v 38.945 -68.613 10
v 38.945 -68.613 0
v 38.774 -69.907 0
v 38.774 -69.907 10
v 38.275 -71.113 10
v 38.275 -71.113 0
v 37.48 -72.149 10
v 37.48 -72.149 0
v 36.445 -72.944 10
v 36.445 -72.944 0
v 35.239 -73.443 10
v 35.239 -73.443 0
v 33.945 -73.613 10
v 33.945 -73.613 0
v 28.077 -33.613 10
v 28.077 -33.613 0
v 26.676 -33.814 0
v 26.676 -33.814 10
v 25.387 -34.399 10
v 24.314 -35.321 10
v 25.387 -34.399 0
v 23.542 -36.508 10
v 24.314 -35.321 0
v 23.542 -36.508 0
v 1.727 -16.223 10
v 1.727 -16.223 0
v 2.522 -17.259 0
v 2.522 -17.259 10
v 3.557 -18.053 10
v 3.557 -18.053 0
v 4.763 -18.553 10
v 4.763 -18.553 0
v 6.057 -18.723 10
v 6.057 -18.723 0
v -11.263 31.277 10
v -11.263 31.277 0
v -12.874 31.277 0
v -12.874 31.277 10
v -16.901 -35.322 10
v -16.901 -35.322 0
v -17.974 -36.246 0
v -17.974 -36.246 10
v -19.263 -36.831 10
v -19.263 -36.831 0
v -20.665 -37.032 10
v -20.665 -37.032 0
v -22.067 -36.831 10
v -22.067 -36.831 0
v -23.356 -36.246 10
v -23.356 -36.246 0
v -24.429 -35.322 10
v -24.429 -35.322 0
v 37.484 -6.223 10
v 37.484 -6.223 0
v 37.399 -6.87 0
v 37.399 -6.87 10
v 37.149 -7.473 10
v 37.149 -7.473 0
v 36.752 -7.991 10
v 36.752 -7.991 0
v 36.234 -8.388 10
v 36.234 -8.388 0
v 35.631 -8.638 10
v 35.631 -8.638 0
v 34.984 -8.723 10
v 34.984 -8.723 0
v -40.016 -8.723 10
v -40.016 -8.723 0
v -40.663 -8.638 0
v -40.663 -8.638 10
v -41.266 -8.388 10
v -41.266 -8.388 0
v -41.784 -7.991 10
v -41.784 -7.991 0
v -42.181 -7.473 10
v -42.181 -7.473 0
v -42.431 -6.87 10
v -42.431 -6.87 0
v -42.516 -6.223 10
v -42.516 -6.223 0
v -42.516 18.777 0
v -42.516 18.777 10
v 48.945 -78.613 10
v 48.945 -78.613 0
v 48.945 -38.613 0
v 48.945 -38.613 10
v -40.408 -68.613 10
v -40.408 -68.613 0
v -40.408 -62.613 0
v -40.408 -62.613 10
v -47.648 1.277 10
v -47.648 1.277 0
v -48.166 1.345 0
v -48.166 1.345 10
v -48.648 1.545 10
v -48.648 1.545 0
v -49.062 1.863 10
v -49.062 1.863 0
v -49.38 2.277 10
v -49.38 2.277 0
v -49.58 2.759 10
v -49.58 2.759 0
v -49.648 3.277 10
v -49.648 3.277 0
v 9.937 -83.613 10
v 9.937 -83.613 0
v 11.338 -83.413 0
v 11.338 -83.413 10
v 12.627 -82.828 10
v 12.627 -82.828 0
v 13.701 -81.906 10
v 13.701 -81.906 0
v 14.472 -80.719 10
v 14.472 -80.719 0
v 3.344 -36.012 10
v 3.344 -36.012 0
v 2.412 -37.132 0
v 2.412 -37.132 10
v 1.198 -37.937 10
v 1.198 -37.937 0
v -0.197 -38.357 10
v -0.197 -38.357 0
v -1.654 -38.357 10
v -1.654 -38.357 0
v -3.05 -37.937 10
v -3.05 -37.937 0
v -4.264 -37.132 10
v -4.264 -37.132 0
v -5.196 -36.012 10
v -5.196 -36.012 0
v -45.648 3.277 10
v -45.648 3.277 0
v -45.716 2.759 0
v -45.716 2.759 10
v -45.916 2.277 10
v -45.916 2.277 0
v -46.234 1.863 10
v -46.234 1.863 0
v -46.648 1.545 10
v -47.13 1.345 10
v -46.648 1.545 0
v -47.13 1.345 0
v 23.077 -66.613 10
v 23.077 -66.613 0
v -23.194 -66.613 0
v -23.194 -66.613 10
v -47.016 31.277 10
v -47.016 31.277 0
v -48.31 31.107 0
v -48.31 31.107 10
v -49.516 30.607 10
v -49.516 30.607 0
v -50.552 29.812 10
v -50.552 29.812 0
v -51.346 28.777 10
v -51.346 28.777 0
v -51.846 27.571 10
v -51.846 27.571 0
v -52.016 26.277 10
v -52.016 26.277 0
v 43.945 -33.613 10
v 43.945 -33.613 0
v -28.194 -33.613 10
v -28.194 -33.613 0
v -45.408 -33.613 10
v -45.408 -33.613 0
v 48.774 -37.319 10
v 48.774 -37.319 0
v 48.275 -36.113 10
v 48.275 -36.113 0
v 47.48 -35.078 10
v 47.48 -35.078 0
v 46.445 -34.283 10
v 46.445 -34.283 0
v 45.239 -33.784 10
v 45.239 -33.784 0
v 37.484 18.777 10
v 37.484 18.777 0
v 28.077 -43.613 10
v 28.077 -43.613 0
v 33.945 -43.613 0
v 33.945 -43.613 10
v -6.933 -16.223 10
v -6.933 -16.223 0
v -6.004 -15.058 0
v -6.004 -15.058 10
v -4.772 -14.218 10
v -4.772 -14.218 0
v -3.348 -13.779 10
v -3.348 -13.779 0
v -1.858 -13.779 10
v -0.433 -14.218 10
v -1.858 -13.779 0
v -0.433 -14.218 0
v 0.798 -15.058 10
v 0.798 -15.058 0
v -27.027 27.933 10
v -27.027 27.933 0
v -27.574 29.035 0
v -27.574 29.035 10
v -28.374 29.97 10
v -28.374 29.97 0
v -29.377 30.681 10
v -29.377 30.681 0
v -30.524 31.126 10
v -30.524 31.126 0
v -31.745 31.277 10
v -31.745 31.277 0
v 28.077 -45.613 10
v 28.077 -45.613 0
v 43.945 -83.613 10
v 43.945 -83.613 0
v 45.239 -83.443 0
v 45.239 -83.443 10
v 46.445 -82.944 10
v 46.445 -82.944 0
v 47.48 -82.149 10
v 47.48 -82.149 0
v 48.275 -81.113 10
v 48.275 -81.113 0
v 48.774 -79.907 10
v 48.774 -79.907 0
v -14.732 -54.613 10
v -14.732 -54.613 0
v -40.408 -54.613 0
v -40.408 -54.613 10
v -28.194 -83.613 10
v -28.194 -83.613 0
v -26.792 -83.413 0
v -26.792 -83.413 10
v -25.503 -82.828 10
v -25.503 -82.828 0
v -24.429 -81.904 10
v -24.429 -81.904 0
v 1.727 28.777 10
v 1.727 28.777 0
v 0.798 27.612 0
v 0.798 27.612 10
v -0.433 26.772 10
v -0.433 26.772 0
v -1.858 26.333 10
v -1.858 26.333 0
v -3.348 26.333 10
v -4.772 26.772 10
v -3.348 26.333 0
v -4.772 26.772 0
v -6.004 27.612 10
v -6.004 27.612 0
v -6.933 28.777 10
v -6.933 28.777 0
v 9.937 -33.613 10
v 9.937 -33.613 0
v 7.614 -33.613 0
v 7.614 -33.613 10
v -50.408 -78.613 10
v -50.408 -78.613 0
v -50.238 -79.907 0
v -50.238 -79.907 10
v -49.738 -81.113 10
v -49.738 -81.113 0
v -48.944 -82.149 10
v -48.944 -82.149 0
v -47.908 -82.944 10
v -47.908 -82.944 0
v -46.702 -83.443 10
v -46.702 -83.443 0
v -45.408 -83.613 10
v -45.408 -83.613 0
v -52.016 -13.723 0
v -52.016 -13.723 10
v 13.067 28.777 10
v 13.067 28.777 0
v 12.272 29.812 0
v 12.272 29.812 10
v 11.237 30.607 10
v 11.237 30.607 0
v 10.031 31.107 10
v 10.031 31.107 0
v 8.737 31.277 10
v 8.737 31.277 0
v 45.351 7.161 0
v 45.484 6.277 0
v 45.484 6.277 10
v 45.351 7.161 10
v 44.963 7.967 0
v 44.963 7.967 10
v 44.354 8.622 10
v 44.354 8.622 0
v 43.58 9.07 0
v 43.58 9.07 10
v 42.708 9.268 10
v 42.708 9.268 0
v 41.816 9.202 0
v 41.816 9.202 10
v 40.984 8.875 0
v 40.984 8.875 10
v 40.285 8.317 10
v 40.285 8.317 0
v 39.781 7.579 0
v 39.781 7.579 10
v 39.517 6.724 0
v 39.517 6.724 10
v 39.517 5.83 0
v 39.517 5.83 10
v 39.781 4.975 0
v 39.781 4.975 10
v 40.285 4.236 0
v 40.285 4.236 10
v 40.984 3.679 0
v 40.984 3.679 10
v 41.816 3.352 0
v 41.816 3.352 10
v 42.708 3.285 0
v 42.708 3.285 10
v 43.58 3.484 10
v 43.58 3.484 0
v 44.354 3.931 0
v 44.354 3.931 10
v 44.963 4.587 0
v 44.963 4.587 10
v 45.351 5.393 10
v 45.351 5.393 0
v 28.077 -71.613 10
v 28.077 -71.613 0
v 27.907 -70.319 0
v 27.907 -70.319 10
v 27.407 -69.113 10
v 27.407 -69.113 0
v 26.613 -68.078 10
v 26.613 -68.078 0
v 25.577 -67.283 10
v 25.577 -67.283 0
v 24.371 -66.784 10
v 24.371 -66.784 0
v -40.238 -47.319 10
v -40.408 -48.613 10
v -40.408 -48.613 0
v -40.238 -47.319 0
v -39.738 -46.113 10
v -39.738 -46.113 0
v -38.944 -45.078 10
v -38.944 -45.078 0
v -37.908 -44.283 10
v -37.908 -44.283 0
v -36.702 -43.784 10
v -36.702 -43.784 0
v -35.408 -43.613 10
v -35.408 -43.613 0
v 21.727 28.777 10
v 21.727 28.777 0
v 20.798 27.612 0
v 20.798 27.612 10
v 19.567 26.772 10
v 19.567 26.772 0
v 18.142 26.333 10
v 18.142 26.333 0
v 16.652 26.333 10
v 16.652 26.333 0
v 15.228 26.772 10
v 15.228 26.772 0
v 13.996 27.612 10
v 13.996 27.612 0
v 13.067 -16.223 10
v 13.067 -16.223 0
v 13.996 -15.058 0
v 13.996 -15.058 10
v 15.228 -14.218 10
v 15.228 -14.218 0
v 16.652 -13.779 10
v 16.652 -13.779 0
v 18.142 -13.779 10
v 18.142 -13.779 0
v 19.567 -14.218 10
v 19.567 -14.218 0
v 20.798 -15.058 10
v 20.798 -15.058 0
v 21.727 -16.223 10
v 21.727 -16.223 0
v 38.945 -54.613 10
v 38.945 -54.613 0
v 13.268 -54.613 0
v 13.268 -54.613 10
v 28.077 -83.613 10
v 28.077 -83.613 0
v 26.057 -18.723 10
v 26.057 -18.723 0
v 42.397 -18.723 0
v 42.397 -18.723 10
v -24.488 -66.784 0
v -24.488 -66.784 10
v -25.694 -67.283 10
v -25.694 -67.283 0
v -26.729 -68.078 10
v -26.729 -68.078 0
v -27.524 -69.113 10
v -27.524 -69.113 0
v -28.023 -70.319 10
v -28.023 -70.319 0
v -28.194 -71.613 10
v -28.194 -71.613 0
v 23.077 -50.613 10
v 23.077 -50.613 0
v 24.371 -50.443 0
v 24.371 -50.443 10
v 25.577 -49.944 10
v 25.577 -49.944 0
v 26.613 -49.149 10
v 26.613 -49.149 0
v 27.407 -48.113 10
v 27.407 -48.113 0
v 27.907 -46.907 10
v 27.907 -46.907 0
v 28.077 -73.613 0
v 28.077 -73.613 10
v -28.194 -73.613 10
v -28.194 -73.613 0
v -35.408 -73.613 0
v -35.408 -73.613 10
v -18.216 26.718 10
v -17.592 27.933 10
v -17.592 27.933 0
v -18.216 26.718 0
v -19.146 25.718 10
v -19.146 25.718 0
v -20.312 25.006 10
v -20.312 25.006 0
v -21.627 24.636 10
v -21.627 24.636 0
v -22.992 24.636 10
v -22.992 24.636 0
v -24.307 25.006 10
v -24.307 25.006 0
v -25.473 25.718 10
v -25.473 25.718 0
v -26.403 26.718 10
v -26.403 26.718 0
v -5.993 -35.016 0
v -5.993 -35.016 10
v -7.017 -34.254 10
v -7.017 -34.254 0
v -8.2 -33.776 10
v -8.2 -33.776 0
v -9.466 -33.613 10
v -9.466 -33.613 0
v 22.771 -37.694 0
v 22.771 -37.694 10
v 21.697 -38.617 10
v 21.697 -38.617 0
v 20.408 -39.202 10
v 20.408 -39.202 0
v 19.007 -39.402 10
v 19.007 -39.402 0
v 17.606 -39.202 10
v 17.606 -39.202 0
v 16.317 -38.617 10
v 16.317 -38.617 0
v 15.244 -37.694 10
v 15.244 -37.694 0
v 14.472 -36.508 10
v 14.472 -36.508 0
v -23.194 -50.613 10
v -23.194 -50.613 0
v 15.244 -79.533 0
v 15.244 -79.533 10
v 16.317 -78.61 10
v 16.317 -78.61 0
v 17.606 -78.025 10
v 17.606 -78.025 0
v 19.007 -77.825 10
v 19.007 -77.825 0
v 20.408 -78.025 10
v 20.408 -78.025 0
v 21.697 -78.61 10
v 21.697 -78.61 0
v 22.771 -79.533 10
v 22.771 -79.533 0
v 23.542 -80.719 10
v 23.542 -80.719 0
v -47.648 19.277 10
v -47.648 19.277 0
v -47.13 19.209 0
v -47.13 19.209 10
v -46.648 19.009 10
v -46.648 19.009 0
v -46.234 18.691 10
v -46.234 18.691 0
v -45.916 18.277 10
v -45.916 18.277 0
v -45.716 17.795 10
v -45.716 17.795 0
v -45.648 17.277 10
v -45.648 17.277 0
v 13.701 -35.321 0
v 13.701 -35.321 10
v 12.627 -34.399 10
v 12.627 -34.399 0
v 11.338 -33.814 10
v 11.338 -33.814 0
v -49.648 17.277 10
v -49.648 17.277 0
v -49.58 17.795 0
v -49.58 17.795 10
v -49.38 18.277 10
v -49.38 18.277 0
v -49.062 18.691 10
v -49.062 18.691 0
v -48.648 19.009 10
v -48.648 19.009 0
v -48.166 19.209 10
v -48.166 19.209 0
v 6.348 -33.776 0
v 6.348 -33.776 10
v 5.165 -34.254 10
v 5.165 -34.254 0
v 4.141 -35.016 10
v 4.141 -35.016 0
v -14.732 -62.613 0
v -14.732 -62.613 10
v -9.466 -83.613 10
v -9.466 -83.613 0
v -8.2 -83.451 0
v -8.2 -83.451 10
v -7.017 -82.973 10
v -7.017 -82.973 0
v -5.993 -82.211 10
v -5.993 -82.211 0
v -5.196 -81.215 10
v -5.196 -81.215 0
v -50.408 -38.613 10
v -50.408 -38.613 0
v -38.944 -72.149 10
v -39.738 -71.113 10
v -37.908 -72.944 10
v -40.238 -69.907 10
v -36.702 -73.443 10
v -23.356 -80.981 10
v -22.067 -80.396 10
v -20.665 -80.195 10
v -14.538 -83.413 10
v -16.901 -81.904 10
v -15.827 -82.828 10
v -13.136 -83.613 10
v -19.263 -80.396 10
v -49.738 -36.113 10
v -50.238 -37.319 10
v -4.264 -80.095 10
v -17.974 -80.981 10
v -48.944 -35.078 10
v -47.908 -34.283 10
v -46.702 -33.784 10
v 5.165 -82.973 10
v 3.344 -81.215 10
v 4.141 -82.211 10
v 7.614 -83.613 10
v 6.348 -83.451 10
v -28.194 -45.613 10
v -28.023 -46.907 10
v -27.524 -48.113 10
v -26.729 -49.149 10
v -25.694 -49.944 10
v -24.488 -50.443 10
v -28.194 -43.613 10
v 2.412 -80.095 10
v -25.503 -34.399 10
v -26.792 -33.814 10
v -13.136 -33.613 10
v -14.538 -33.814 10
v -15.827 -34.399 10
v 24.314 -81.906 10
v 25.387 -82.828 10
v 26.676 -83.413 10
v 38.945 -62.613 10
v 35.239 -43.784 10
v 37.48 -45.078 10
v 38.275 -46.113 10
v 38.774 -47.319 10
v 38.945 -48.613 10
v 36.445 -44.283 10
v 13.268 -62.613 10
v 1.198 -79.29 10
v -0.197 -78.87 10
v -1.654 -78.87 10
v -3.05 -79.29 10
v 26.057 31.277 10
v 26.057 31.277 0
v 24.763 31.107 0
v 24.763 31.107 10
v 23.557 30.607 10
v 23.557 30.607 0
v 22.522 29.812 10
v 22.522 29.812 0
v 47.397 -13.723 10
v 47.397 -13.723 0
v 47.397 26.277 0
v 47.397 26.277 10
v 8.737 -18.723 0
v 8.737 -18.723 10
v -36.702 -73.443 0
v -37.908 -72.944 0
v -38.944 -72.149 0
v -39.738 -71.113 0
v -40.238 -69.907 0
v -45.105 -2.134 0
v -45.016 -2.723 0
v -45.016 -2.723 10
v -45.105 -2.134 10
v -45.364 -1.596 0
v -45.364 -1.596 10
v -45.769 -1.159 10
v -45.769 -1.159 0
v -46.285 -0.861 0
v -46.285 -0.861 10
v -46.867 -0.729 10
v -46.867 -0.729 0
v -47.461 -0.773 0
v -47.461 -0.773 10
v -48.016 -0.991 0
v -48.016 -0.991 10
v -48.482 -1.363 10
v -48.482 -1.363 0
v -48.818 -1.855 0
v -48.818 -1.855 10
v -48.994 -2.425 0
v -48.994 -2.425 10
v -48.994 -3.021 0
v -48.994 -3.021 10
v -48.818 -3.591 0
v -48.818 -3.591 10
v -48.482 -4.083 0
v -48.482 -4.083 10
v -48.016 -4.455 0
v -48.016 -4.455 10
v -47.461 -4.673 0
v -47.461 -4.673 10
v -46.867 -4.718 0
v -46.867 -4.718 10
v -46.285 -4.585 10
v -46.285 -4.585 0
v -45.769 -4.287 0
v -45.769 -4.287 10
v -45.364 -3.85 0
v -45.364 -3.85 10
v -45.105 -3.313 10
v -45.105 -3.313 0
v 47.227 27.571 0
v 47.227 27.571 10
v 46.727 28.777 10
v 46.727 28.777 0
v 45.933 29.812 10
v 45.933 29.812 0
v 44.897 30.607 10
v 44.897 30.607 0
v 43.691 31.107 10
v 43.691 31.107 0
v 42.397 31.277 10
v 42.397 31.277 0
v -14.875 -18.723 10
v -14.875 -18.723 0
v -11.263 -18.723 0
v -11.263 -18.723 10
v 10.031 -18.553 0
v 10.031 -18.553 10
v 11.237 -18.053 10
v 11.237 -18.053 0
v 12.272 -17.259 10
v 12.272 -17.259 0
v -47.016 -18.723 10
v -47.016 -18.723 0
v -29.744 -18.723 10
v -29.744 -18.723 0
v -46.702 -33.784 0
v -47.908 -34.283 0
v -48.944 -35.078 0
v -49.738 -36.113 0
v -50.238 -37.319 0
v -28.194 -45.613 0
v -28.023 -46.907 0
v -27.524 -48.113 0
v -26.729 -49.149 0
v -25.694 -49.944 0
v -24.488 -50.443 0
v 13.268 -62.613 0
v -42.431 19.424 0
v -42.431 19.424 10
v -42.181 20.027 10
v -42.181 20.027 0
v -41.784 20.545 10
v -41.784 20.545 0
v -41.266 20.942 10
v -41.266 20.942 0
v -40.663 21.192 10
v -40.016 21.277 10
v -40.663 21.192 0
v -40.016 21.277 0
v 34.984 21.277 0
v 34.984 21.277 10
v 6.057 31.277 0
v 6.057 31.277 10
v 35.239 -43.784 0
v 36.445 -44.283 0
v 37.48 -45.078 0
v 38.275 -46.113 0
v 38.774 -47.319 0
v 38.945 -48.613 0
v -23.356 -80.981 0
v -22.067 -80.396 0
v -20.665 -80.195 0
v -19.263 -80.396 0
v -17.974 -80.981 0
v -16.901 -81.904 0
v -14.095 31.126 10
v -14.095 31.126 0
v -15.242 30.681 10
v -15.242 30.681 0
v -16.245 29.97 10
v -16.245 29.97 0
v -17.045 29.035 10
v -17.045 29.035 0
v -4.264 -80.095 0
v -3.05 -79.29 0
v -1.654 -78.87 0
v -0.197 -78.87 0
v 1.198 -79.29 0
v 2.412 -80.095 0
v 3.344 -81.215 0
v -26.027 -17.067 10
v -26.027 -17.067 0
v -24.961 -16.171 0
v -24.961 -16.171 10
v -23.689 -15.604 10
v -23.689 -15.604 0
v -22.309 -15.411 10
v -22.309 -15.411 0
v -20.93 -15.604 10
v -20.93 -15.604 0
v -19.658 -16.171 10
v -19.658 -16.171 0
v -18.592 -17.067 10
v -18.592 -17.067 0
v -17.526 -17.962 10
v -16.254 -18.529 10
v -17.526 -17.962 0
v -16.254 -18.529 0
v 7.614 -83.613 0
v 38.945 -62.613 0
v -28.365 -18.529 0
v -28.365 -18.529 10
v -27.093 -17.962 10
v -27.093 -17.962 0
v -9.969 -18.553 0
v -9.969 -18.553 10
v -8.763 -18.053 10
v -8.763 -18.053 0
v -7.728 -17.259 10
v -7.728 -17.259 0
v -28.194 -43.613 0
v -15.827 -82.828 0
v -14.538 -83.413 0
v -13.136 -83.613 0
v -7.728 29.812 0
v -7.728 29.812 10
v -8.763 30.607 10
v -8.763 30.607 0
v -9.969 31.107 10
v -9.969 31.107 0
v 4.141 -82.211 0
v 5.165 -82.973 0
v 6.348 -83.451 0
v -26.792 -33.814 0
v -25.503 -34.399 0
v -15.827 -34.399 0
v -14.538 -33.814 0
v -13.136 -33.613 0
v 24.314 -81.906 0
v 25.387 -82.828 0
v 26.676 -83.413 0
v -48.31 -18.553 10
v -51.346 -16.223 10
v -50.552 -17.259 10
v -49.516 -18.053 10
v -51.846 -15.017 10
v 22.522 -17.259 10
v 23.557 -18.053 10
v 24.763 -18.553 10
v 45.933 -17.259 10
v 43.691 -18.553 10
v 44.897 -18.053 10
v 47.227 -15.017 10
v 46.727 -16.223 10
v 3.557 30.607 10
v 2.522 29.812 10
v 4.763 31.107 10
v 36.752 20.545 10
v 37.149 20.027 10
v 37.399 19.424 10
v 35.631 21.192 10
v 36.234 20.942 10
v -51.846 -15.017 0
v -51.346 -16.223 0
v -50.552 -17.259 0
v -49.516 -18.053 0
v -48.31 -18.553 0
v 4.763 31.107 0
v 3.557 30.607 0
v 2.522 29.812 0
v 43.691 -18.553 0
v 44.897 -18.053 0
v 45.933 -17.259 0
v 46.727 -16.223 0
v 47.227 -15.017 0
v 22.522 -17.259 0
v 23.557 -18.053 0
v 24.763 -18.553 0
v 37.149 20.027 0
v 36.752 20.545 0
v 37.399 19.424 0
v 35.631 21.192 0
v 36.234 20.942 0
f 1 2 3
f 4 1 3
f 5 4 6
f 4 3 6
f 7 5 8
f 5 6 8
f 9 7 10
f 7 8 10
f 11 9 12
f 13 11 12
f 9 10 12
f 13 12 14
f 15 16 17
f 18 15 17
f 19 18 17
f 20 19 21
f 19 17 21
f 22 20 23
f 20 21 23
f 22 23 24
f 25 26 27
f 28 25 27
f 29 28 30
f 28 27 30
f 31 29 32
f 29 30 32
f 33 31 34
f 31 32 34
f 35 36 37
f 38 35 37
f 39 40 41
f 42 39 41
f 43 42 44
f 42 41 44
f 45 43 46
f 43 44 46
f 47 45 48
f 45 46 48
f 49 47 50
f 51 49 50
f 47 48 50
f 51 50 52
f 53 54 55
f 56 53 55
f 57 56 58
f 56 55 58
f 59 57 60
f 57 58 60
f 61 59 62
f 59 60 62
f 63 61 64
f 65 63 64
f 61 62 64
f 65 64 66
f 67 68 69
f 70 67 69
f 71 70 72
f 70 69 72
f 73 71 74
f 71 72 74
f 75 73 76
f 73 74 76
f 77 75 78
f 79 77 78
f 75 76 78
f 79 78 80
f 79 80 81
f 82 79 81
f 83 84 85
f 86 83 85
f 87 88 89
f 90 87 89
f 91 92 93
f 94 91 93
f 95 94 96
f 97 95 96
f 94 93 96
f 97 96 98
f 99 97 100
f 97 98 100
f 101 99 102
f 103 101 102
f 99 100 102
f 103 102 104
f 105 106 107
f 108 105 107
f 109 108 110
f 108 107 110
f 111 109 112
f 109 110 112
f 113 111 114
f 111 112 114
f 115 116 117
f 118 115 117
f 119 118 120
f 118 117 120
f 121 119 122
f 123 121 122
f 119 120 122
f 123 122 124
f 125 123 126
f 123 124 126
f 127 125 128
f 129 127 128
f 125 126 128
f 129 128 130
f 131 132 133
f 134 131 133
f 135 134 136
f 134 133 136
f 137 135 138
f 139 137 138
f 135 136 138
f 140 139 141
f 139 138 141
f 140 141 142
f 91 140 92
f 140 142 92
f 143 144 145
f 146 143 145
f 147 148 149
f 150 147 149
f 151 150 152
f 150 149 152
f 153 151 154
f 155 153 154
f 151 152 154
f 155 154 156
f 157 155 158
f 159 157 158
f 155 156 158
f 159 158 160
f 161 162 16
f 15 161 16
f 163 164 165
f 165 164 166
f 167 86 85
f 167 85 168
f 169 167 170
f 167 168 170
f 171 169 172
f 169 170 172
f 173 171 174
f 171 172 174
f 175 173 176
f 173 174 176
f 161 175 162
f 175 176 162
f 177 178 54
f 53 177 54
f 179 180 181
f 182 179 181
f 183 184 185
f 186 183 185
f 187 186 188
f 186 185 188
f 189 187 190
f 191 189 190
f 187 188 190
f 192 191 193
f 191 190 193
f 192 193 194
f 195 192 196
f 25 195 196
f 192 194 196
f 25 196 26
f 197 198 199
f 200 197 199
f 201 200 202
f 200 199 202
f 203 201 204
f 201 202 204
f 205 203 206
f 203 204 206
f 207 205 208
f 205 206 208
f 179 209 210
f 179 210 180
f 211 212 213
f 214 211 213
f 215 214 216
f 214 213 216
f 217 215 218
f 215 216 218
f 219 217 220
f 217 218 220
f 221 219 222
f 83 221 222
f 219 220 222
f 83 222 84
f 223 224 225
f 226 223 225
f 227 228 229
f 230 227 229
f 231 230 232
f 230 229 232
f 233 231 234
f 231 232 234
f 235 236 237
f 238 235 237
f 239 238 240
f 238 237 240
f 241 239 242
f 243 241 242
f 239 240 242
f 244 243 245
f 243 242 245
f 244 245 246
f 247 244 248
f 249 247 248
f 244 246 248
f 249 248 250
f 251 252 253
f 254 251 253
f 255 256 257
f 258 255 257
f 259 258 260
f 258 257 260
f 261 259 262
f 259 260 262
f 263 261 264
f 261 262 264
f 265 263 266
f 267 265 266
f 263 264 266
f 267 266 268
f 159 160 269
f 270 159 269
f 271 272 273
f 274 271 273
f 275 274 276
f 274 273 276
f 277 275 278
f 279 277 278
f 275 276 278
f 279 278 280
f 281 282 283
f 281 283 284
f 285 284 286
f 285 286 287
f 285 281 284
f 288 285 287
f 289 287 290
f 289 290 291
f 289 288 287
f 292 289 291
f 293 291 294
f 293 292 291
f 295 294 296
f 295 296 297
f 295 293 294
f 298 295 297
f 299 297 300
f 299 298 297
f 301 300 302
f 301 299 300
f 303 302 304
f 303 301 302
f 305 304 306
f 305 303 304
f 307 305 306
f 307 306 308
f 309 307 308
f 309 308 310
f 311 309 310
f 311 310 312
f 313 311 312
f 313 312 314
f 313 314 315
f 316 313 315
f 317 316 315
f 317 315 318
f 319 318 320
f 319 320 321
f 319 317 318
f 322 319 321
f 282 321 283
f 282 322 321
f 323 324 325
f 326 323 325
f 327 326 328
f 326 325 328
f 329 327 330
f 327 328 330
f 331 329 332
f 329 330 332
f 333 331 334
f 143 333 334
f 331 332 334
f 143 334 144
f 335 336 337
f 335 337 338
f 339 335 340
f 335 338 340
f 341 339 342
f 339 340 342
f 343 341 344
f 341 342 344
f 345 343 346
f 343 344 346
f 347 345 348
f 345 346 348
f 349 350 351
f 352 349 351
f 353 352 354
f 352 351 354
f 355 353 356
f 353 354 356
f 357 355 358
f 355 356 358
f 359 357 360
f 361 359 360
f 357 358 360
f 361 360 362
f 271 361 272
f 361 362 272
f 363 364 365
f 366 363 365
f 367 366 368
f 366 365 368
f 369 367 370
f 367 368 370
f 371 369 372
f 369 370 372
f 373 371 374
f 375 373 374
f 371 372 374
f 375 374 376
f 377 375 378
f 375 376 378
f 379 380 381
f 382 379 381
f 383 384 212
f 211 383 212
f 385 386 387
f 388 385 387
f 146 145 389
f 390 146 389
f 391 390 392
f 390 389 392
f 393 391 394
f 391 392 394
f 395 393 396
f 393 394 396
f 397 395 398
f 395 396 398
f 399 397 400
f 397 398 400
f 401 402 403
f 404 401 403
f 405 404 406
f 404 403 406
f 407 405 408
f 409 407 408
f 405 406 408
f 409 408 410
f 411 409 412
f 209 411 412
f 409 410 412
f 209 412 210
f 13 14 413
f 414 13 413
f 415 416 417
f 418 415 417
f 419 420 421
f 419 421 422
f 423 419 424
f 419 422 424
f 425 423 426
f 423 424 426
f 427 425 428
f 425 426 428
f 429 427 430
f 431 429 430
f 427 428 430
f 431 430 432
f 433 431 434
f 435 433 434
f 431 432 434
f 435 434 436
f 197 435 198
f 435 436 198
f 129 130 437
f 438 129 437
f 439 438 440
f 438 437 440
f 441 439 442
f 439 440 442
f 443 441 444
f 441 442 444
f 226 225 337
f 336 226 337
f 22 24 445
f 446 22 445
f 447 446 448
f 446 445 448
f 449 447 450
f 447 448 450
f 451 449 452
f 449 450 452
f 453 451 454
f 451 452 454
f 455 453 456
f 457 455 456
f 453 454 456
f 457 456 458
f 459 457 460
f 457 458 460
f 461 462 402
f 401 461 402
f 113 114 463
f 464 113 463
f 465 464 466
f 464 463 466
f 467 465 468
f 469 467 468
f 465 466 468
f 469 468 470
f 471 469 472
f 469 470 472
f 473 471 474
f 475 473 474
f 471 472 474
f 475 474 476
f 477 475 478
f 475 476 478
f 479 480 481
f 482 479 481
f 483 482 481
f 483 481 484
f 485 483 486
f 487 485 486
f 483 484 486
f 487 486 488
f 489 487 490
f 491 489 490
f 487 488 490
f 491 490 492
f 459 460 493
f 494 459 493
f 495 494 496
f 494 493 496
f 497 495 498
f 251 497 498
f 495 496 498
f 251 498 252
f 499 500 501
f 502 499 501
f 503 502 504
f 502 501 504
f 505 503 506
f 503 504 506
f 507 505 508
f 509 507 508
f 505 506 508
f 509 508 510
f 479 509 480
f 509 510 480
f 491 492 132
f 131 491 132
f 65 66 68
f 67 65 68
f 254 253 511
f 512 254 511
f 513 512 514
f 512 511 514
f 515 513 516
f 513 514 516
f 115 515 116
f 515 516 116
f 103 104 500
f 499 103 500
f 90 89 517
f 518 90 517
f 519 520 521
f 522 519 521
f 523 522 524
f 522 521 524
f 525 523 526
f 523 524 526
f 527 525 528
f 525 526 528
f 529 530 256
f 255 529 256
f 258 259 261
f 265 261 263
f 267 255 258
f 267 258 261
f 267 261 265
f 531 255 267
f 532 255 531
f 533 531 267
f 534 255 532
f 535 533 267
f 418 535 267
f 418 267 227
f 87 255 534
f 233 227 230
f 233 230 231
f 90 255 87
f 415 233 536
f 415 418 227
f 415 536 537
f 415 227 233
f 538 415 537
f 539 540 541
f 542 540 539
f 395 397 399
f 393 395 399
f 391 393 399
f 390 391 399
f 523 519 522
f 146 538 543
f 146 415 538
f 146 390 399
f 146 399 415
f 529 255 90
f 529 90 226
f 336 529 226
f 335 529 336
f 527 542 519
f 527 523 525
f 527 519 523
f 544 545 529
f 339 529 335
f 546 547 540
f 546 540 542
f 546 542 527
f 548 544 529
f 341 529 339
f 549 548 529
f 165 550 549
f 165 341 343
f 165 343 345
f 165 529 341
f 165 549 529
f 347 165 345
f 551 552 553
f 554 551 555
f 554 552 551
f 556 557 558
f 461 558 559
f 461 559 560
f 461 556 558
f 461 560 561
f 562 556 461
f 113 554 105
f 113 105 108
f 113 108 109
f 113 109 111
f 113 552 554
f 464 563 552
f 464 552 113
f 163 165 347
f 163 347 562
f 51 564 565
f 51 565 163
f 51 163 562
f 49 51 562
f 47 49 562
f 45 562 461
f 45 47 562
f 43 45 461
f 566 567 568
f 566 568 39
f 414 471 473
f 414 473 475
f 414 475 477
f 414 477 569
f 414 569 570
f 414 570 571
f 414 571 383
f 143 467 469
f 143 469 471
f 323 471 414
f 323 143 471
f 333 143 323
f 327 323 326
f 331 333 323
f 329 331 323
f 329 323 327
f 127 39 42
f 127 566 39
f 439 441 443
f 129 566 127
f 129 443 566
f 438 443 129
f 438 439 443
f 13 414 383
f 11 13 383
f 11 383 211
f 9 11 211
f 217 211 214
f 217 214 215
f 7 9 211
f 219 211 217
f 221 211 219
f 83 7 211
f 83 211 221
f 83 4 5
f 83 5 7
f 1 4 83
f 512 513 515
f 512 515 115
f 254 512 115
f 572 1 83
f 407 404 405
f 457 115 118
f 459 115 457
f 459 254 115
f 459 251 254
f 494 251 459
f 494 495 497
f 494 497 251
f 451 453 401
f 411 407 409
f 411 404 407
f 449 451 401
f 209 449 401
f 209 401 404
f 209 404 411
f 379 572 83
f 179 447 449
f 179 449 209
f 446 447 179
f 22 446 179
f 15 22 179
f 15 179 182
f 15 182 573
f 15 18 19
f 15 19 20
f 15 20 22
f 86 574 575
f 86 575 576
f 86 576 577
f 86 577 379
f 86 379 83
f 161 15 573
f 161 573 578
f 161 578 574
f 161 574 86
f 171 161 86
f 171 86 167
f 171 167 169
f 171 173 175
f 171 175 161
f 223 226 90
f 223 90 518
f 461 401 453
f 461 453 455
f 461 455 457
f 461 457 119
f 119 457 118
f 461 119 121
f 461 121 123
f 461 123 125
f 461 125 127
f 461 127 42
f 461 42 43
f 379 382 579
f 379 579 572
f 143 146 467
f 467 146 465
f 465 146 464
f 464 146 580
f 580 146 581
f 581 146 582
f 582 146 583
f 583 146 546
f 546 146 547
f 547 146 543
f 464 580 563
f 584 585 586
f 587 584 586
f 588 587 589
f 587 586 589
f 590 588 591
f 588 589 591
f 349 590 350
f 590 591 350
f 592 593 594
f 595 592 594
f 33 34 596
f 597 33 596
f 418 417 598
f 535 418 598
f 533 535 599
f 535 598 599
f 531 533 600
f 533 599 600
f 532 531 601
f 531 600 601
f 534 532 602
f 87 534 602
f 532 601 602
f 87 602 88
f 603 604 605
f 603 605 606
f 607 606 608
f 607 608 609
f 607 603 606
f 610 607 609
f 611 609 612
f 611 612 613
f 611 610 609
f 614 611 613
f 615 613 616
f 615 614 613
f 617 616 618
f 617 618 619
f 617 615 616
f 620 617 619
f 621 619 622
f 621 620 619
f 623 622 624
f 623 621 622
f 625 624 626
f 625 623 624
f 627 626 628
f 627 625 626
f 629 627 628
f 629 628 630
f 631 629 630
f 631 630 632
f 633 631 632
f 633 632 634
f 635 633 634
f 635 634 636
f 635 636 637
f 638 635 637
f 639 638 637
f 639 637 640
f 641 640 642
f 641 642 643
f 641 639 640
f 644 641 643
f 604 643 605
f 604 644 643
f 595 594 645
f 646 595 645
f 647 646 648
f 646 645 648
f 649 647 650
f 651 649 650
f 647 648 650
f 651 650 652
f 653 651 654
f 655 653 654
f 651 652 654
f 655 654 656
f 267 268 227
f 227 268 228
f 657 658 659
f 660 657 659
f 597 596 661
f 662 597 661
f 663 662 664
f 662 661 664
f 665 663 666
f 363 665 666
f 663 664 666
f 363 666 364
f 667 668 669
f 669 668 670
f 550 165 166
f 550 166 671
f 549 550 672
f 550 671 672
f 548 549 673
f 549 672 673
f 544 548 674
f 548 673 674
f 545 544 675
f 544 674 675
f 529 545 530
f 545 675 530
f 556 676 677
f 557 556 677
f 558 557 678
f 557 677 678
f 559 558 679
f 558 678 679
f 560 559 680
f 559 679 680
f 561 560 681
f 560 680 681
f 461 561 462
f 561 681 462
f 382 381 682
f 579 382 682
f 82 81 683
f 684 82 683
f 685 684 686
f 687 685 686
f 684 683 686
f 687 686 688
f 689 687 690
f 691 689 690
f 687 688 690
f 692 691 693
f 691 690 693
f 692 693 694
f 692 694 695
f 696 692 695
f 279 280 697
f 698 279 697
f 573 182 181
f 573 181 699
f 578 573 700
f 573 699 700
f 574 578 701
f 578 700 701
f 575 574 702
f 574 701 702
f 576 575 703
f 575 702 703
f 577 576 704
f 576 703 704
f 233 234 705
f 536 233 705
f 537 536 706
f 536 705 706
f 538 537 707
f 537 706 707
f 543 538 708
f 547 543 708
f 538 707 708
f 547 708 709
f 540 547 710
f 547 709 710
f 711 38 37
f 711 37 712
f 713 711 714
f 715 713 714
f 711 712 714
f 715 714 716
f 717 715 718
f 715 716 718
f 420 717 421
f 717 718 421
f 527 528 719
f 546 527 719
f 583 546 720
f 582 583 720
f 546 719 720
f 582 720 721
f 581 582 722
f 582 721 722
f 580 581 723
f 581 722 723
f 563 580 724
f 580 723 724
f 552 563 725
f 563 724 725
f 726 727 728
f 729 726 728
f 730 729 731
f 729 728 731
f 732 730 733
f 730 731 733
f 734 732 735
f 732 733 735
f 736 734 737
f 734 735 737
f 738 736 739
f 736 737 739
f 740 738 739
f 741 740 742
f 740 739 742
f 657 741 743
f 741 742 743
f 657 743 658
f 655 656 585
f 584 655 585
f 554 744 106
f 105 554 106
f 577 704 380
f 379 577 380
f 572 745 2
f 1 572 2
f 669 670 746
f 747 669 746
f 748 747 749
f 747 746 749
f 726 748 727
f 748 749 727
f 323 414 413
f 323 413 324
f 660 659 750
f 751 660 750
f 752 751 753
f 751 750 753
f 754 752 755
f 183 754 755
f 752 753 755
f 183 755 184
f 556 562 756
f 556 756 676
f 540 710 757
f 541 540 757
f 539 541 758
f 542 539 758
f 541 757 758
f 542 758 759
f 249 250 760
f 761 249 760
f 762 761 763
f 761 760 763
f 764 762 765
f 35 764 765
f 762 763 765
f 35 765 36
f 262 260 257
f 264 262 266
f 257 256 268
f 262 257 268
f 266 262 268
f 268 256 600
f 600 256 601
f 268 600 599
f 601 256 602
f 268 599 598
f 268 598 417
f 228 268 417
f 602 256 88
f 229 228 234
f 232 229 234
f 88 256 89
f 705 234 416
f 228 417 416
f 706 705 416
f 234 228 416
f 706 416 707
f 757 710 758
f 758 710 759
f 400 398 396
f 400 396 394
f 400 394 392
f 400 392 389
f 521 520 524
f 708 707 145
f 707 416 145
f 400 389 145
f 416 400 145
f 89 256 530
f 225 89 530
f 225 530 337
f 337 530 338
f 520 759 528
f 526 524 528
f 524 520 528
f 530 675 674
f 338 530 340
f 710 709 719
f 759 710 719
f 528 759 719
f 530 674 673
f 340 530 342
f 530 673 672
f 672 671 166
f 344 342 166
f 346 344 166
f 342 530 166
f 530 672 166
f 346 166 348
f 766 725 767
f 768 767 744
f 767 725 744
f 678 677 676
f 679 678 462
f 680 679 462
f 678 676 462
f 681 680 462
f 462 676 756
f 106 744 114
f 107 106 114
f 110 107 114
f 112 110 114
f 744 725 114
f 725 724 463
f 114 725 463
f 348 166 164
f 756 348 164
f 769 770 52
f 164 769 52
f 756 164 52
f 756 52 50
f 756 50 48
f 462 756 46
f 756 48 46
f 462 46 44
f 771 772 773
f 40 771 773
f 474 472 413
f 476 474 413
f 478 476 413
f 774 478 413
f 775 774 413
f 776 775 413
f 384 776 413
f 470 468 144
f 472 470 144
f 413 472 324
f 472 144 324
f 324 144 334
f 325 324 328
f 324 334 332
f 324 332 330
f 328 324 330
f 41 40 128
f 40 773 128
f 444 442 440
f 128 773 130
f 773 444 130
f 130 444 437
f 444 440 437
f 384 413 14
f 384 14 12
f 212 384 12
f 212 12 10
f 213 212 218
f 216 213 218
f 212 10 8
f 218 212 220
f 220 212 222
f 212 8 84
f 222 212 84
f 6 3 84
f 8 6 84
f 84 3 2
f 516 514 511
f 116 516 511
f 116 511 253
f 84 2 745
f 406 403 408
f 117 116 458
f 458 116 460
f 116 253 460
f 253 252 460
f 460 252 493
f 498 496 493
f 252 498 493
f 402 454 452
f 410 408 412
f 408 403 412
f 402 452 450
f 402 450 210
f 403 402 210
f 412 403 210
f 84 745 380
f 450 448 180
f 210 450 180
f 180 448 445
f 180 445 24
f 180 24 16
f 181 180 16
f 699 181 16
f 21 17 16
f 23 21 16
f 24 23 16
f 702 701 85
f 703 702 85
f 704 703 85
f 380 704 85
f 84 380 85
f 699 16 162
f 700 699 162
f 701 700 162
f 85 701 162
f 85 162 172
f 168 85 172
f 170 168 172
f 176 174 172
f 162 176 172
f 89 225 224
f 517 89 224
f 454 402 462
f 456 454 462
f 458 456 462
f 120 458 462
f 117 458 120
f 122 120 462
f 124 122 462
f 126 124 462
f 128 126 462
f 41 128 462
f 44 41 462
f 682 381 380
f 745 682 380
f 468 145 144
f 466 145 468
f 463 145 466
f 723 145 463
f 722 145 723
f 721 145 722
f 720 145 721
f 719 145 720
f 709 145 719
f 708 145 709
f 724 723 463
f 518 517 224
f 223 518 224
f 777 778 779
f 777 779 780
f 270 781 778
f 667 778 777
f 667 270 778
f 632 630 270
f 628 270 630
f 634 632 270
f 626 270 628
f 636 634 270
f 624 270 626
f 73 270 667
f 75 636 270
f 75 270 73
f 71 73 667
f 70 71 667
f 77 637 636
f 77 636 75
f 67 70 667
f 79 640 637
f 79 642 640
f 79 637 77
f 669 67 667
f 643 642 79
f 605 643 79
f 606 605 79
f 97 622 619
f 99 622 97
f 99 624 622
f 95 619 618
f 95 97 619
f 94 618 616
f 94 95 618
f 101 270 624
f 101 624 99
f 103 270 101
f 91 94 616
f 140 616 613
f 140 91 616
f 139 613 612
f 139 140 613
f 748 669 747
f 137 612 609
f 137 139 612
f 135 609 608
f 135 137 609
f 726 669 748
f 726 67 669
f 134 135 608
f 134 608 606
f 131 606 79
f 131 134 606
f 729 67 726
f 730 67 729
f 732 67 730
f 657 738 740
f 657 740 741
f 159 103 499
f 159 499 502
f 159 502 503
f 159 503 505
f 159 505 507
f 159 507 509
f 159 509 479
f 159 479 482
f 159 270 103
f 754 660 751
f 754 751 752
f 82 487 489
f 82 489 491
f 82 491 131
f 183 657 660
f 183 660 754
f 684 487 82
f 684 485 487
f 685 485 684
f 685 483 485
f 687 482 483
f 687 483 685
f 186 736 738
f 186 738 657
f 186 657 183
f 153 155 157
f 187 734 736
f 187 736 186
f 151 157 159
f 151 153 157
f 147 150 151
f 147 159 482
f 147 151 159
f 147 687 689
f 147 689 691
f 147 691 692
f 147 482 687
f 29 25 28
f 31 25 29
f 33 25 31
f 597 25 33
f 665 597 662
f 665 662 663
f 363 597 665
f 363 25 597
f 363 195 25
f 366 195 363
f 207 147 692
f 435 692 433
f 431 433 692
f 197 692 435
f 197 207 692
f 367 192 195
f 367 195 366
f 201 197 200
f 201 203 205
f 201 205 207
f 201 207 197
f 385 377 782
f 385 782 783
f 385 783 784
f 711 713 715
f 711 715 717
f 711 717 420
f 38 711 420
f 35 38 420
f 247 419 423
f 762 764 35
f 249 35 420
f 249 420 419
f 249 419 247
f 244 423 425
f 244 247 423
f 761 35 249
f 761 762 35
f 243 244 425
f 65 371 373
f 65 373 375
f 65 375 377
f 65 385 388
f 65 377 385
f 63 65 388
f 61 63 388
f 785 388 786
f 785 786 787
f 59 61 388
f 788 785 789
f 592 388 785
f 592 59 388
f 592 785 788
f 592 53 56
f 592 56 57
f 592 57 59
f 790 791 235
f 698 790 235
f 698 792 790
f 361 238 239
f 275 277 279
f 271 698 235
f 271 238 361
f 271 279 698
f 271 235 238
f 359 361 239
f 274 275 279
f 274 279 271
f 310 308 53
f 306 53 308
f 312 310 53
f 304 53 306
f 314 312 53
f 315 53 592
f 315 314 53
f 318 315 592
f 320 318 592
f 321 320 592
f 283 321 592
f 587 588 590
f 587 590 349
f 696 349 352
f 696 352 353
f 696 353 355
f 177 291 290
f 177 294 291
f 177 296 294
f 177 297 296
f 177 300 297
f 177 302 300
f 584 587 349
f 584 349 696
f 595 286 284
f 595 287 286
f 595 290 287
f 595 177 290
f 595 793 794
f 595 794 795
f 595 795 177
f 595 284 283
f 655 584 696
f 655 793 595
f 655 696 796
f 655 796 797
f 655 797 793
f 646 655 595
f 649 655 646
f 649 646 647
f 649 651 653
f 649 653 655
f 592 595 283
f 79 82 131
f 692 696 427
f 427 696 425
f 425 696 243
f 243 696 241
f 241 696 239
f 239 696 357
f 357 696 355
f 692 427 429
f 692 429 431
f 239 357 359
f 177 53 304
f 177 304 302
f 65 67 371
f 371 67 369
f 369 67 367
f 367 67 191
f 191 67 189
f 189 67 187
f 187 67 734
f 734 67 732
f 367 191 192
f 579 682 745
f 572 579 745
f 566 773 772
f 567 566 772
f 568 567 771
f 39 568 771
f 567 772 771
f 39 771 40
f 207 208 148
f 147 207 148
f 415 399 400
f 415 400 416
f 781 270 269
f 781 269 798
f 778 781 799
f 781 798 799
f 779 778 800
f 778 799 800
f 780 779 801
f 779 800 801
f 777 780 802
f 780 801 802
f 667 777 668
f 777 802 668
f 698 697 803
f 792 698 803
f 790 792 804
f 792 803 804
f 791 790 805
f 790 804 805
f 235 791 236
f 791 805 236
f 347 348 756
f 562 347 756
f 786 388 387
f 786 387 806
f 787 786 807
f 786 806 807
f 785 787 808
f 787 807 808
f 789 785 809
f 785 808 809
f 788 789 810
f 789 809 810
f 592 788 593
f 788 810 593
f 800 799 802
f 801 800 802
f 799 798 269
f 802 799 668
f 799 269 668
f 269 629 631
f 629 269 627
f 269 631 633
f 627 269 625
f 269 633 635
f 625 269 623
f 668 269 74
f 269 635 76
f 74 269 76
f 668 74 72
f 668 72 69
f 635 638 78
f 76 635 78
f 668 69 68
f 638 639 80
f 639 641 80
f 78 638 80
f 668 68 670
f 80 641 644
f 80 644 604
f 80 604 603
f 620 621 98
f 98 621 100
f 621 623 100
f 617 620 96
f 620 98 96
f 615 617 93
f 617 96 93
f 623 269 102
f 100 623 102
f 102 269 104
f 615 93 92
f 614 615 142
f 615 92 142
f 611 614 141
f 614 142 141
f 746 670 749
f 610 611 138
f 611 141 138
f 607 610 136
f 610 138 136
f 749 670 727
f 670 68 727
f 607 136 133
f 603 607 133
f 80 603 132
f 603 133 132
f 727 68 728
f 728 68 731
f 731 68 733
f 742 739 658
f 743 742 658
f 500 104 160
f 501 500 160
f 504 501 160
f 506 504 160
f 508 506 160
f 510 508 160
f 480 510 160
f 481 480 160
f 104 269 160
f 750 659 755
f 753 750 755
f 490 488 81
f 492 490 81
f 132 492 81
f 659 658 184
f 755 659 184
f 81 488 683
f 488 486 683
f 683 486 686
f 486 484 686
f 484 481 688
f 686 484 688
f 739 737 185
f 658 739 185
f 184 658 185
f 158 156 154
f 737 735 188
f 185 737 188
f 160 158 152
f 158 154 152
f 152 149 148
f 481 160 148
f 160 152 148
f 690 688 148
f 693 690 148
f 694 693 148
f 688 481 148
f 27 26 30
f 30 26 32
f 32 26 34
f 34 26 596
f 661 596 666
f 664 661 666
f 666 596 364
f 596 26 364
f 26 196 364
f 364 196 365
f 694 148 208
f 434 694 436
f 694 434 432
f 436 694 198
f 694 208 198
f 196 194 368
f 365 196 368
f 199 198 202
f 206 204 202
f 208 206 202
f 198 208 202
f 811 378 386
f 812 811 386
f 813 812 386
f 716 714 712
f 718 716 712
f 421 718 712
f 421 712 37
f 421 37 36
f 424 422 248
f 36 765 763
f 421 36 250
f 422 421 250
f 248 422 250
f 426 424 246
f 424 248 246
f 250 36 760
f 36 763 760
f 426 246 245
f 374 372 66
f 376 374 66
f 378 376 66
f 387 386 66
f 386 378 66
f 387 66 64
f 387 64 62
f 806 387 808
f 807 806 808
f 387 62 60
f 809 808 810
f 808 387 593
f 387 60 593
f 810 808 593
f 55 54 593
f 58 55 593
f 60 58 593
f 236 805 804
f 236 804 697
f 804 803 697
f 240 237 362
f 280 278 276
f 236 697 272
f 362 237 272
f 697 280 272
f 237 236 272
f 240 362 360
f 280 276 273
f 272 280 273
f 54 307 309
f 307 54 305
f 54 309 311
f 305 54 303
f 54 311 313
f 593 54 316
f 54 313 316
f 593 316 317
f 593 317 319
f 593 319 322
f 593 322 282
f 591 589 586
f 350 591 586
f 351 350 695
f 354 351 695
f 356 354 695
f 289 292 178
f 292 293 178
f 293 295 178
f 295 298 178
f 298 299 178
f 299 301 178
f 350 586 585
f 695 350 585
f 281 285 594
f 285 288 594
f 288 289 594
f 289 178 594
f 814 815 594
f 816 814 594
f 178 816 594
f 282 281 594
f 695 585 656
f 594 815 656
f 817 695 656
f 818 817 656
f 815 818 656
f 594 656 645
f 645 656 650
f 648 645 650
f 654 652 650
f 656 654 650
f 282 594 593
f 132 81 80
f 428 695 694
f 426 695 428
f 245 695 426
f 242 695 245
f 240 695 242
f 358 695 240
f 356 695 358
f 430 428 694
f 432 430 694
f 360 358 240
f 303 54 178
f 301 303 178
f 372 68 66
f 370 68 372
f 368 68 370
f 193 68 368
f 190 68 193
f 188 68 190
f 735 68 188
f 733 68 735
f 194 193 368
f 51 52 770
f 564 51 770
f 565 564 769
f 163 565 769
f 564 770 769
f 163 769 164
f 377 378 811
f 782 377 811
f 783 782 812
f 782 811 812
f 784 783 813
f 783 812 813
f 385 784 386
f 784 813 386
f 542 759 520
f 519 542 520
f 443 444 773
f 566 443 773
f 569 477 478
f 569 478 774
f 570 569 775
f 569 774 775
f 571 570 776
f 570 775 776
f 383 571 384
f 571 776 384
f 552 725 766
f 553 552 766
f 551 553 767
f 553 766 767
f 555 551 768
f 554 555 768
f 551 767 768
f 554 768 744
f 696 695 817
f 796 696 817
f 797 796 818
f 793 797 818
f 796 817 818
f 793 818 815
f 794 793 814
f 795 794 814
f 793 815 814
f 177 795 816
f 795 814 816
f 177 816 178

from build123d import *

# Parameters (mm, degrees)
F0_R     = 2
F0_R_2   = 3
F1_DEPTH = 10


with BuildPart() as f1:
    # F0 (on Top) → F1 (new body)
    with BuildSketch(Plane.XY):
        with BuildLine():
            Line((-31.744891, 31.276881), (-47.016129, 31.276881))
            ThreePointArc((-47.016129, 31.276881), (-50.551663, 29.812415), (-52.016129, 26.276881))
            Line((-52.016129, 26.276881), (-52.016129, -13.723119))
            ThreePointArc((-52.016129, -13.723119), (-50.551663, -17.258653), (-47.016129, -18.723119))
            Line((-47.016129, -18.723119), (-29.744406, -18.723119))
            ThreePointArc((-29.744406, -18.723119), (-27.709536, -18.290318), (-26.026944, -17.06684))
            ThreePointArc((-26.026944, -17.06684), (-22.309481, -15.410562), (-18.592019, -17.06684))
            ThreePointArc((-18.592019, -17.06684), (-16.909426, -18.290318), (-14.874556, -18.723119))
            Line((-14.874556, -18.723119), (-11.263087, -18.723119))
            ThreePointArc((-11.263087, -18.723119), (-8.763087, -18.053246), (-6.93296, -16.223119))
            ThreePointArc((-6.93296, -16.223119), (-2.602833, -13.723119), (1.727294, -16.223119))
            ThreePointArc((1.727294, -16.223119), (3.557421, -18.053246), (6.057421, -18.723119))
            Line((6.057421, -18.723119), (8.736913, -18.723119))
            ThreePointArc((8.736913, -18.723119), (11.236913, -18.053246), (13.06704, -16.223119))
            ThreePointArc((13.06704, -16.223119), (17.397167, -13.723119), (21.727294, -16.223119))
            ThreePointArc((21.727294, -16.223119), (23.557421, -18.053246), (26.057421, -18.723119))
            Line((26.057421, -18.723119), (42.397167, -18.723119))
            ThreePointArc((42.397167, -18.723119), (45.932701, -17.258653), (47.397167, -13.723119))
            Line((47.397167, -13.723119), (47.397167, 26.276881))
            ThreePointArc((47.397167, 26.276881), (45.932701, 29.812415), (42.397167, 31.276881))
            Line((42.397167, 31.276881), (26.057421, 31.276881))
            ThreePointArc((26.057421, 31.276881), (23.557421, 30.607008), (21.727294, 28.776881))
            ThreePointArc((21.727294, 28.776881), (17.397167, 26.276881), (13.06704, 28.776881))
            ThreePointArc((13.06704, 28.776881), (11.236913, 30.607008), (8.736913, 31.276881))
            Line((8.736913, 31.276881), (6.057421, 31.276881))
            ThreePointArc((6.057421, 31.276881), (3.557421, 30.607008), (1.727294, 28.776881))
            ThreePointArc((1.727294, 28.776881), (-2.602833, 26.276881), (-6.93296, 28.776881))
            ThreePointArc((-6.93296, 28.776881), (-8.763087, 30.607008), (-11.263087, 31.276881))
            Line((-11.263087, 31.276881), (-12.874071, 31.276881))
            ThreePointArc((-12.874071, 31.276881), (-15.765317, 30.356182), (-17.591776, 27.93316))
            ThreePointArc((-17.591776, 27.93316), (-22.309481, 24.589438), (-27.027186, 27.93316))
            ThreePointArc((-27.027186, 27.93316), (-28.853645, 30.356182), (-31.744891, 31.276881))
        make_face()
        with Locations((-47.016129, -2.723119)):
            Circle(F0_R, mode=Mode.SUBTRACT)
        with BuildLine():
            ThreePointArc((-47.648095, 1.276881), (-49.062308, 1.862667), (-49.648095, 3.276881))
            Line((-49.648095, 3.276881), (-49.648095, 17.276881))
            ThreePointArc((-49.648095, 17.276881), (-49.062308, 18.691095), (-47.648095, 19.276881))
            ThreePointArc((-47.648095, 19.276881), (-46.233881, 18.691095), (-45.648095, 17.276881))
            Line((-45.648095, 17.276881), (-45.648095, 3.276881))
            ThreePointArc((-45.648095, 3.276881), (-46.233881, 1.862667), (-47.648095, 1.276881))
        make_face(mode=Mode.SUBTRACT)
        with BuildLine():
            Line((-42.516129, -6.223119), (-42.516129, 18.776881))
            ThreePointArc((-42.516129, 18.776881), (-41.783896, 20.544648), (-40.016129, 21.276881))
            Line((-40.016129, 21.276881), (34.983871, 21.276881))
            ThreePointArc((34.983871, 21.276881), (36.751638, 20.544648), (37.483871, 18.776881))
            Line((37.483871, 18.776881), (37.483871, -6.223119))
            ThreePointArc((37.483871, -6.223119), (36.751638, -7.990886), (34.983871, -8.723119))
            Line((34.983871, -8.723119), (-40.016129, -8.723119))
            ThreePointArc((-40.016129, -8.723119), (-41.783896, -7.990886), (-42.516129, -6.223119))
        make_face(mode=Mode.SUBTRACT)
        with Locations((42.483871, 6.276881)):
            Circle(F0_R_2, mode=Mode.SUBTRACT)
        with BuildLine():
            Line((-28.193538, -33.613396), (-45.408177, -33.613396))
            ThreePointArc((-45.408177, -33.613396), (-48.943711, -35.077862), (-50.408177, -38.613396))
            Line((-50.408177, -38.613396), (-50.408177, -43.613396))
            Line((-50.408177, -43.613396), (-50.408177, -73.613396))
            Line((-50.408177, -73.613396), (-50.408177, -78.613396))
            ThreePointArc((-50.408177, -78.613396), (-48.943711, -82.14893), (-45.408177, -83.613396))
            Line((-45.408177, -83.613396), (-28.193538, -83.613396))
            ThreePointArc((-28.193538, -83.613396), (-26.126502, -83.166127), (-24.429275, -81.904341))
            ThreePointArc((-24.429275, -81.904341), (-20.665012, -80.195287), (-16.900749, -81.904341))
            ThreePointArc((-16.900749, -81.904341), (-15.203521, -83.166127), (-13.136486, -83.613396))
            Line((-13.136486, -83.613396), (-9.465551, -83.613396))
            ThreePointArc((-9.465551, -83.613396), (-7.01694, -82.972789), (-5.195769, -81.215119))
            ThreePointArc((-5.195769, -81.215119), (-0.925987, -78.816841), (3.343795, -81.215119))
            ThreePointArc((3.343795, -81.215119), (5.164967, -82.972789), (7.613577, -83.613396))
            Line((7.613577, -83.613396), (9.937365, -83.613396))
            ThreePointArc((9.937365, -83.613396), (12.627289, -82.828168), (14.472332, -80.719119))
            ThreePointArc((14.472332, -80.719119), (19.007299, -77.824843), (23.542267, -80.719119))
            ThreePointArc((23.542267, -80.719119), (25.38731, -82.828168), (28.077234, -83.613396))
            Line((28.077234, -83.613396), (43.944726, -83.613396))
            ThreePointArc((43.944726, -83.613396), (47.48026, -82.14893), (48.944726, -78.613396))
            Line((48.944726, -78.613396), (48.944726, -38.613396))
            ThreePointArc((48.944726, -38.613396), (47.48026, -35.077862), (43.944726, -33.613396))
            Line((43.944726, -33.613396), (28.077234, -33.613396))
            ThreePointArc((28.077234, -33.613396), (25.38731, -34.398623), (23.542267, -36.507672))
            ThreePointArc((23.542267, -36.507672), (19.007299, -39.401949), (14.472332, -36.507672))
            ThreePointArc((14.472332, -36.507672), (12.627289, -34.398623), (9.937365, -33.613396))
            Line((9.937365, -33.613396), (7.613577, -33.613396))
            ThreePointArc((7.613577, -33.613396), (5.164967, -34.254003), (3.343795, -36.011673))
            ThreePointArc((3.343795, -36.011673), (-0.925987, -38.40995), (-5.195769, -36.011673))
            ThreePointArc((-5.195769, -36.011673), (-7.01694, -34.254003), (-9.465551, -33.613396))
            Line((-9.465551, -33.613396), (-13.136486, -33.613396))
            ThreePointArc((-13.136486, -33.613396), (-15.203521, -34.060664), (-16.900749, -35.32245))
            ThreePointArc((-16.900749, -35.32245), (-20.665012, -37.031504), (-24.429275, -35.32245))
            ThreePointArc((-24.429275, -35.32245), (-26.126502, -34.060664), (-28.193538, -33.613396))
        make_face()
        with BuildLine():
            Line((-40.408177, -54.613396), (-40.408177, -48.613396))
            ThreePointArc((-40.408177, -48.613396), (-38.943711, -45.077862), (-35.408177, -43.613396))
            Line((-35.408177, -43.613396), (-28.193538, -43.613396))
            Line((-28.193538, -43.613396), (-28.193538, -45.613396))
            ThreePointArc((-28.193538, -45.613396), (-26.729071, -49.14893), (-23.193538, -50.613396))
            Line((-23.193538, -50.613396), (0, -50.613396))
            Line((0, -50.613396), (23.077234, -50.613396))
            ThreePointArc((23.077234, -50.613396), (26.612768, -49.14893), (28.077234, -45.613396))
            Line((28.077234, -45.613396), (28.077234, -43.613396))
            Line((28.077234, -43.613396), (33.944726, -43.613396))
            ThreePointArc((33.944726, -43.613396), (37.48026, -45.077862), (38.944726, -48.613396))
            Line((38.944726, -48.613396), (38.944726, -54.613396))
            Line((38.944726, -54.613396), (26.944726, -54.613396))
            Line((26.944726, -54.613396), (13.268275, -54.613396))
            Line((13.268275, -54.613396), (13.268275, -62.613396))
            Line((13.268275, -62.613396), (26.944726, -62.613396))
            Line((26.944726, -62.613396), (38.944726, -62.613396))
            Line((38.944726, -62.613396), (38.944726, -68.613396))
            ThreePointArc((38.944726, -68.613396), (37.48026, -72.14893), (33.944726, -73.613396))
            Line((33.944726, -73.613396), (28.077234, -73.613396))
            Line((28.077234, -73.613396), (28.077234, -71.613396))
            ThreePointArc((28.077234, -71.613396), (26.612768, -68.077862), (23.077234, -66.613396))
            Line((23.077234, -66.613396), (0, -66.613396))
            Line((0, -66.613396), (-23.193538, -66.613396))
            ThreePointArc((-23.193538, -66.613396), (-26.729071, -68.077862), (-28.193538, -71.613396))
            Line((-28.193538, -71.613396), (-28.193538, -73.613396))
            Line((-28.193538, -73.613396), (-35.408177, -73.613396))
            ThreePointArc((-35.408177, -73.613396), (-38.943711, -72.14893), (-40.408177, -68.613396))
            Line((-40.408177, -68.613396), (-40.408177, -62.613396))
            Line((-40.408177, -62.613396), (-28.408177, -62.613396))
            Line((-28.408177, -62.613396), (-14.731725, -62.613396))
            Line((-14.731725, -62.613396), (-14.731725, -54.613396))
            Line((-14.731725, -54.613396), (-28.408177, -54.613396))
            Line((-28.408177, -54.613396), (-40.408177, -54.613396))
        make_face(mode=Mode.SUBTRACT)
    extrude(amount=F1_DEPTH)


solid = f1.part
